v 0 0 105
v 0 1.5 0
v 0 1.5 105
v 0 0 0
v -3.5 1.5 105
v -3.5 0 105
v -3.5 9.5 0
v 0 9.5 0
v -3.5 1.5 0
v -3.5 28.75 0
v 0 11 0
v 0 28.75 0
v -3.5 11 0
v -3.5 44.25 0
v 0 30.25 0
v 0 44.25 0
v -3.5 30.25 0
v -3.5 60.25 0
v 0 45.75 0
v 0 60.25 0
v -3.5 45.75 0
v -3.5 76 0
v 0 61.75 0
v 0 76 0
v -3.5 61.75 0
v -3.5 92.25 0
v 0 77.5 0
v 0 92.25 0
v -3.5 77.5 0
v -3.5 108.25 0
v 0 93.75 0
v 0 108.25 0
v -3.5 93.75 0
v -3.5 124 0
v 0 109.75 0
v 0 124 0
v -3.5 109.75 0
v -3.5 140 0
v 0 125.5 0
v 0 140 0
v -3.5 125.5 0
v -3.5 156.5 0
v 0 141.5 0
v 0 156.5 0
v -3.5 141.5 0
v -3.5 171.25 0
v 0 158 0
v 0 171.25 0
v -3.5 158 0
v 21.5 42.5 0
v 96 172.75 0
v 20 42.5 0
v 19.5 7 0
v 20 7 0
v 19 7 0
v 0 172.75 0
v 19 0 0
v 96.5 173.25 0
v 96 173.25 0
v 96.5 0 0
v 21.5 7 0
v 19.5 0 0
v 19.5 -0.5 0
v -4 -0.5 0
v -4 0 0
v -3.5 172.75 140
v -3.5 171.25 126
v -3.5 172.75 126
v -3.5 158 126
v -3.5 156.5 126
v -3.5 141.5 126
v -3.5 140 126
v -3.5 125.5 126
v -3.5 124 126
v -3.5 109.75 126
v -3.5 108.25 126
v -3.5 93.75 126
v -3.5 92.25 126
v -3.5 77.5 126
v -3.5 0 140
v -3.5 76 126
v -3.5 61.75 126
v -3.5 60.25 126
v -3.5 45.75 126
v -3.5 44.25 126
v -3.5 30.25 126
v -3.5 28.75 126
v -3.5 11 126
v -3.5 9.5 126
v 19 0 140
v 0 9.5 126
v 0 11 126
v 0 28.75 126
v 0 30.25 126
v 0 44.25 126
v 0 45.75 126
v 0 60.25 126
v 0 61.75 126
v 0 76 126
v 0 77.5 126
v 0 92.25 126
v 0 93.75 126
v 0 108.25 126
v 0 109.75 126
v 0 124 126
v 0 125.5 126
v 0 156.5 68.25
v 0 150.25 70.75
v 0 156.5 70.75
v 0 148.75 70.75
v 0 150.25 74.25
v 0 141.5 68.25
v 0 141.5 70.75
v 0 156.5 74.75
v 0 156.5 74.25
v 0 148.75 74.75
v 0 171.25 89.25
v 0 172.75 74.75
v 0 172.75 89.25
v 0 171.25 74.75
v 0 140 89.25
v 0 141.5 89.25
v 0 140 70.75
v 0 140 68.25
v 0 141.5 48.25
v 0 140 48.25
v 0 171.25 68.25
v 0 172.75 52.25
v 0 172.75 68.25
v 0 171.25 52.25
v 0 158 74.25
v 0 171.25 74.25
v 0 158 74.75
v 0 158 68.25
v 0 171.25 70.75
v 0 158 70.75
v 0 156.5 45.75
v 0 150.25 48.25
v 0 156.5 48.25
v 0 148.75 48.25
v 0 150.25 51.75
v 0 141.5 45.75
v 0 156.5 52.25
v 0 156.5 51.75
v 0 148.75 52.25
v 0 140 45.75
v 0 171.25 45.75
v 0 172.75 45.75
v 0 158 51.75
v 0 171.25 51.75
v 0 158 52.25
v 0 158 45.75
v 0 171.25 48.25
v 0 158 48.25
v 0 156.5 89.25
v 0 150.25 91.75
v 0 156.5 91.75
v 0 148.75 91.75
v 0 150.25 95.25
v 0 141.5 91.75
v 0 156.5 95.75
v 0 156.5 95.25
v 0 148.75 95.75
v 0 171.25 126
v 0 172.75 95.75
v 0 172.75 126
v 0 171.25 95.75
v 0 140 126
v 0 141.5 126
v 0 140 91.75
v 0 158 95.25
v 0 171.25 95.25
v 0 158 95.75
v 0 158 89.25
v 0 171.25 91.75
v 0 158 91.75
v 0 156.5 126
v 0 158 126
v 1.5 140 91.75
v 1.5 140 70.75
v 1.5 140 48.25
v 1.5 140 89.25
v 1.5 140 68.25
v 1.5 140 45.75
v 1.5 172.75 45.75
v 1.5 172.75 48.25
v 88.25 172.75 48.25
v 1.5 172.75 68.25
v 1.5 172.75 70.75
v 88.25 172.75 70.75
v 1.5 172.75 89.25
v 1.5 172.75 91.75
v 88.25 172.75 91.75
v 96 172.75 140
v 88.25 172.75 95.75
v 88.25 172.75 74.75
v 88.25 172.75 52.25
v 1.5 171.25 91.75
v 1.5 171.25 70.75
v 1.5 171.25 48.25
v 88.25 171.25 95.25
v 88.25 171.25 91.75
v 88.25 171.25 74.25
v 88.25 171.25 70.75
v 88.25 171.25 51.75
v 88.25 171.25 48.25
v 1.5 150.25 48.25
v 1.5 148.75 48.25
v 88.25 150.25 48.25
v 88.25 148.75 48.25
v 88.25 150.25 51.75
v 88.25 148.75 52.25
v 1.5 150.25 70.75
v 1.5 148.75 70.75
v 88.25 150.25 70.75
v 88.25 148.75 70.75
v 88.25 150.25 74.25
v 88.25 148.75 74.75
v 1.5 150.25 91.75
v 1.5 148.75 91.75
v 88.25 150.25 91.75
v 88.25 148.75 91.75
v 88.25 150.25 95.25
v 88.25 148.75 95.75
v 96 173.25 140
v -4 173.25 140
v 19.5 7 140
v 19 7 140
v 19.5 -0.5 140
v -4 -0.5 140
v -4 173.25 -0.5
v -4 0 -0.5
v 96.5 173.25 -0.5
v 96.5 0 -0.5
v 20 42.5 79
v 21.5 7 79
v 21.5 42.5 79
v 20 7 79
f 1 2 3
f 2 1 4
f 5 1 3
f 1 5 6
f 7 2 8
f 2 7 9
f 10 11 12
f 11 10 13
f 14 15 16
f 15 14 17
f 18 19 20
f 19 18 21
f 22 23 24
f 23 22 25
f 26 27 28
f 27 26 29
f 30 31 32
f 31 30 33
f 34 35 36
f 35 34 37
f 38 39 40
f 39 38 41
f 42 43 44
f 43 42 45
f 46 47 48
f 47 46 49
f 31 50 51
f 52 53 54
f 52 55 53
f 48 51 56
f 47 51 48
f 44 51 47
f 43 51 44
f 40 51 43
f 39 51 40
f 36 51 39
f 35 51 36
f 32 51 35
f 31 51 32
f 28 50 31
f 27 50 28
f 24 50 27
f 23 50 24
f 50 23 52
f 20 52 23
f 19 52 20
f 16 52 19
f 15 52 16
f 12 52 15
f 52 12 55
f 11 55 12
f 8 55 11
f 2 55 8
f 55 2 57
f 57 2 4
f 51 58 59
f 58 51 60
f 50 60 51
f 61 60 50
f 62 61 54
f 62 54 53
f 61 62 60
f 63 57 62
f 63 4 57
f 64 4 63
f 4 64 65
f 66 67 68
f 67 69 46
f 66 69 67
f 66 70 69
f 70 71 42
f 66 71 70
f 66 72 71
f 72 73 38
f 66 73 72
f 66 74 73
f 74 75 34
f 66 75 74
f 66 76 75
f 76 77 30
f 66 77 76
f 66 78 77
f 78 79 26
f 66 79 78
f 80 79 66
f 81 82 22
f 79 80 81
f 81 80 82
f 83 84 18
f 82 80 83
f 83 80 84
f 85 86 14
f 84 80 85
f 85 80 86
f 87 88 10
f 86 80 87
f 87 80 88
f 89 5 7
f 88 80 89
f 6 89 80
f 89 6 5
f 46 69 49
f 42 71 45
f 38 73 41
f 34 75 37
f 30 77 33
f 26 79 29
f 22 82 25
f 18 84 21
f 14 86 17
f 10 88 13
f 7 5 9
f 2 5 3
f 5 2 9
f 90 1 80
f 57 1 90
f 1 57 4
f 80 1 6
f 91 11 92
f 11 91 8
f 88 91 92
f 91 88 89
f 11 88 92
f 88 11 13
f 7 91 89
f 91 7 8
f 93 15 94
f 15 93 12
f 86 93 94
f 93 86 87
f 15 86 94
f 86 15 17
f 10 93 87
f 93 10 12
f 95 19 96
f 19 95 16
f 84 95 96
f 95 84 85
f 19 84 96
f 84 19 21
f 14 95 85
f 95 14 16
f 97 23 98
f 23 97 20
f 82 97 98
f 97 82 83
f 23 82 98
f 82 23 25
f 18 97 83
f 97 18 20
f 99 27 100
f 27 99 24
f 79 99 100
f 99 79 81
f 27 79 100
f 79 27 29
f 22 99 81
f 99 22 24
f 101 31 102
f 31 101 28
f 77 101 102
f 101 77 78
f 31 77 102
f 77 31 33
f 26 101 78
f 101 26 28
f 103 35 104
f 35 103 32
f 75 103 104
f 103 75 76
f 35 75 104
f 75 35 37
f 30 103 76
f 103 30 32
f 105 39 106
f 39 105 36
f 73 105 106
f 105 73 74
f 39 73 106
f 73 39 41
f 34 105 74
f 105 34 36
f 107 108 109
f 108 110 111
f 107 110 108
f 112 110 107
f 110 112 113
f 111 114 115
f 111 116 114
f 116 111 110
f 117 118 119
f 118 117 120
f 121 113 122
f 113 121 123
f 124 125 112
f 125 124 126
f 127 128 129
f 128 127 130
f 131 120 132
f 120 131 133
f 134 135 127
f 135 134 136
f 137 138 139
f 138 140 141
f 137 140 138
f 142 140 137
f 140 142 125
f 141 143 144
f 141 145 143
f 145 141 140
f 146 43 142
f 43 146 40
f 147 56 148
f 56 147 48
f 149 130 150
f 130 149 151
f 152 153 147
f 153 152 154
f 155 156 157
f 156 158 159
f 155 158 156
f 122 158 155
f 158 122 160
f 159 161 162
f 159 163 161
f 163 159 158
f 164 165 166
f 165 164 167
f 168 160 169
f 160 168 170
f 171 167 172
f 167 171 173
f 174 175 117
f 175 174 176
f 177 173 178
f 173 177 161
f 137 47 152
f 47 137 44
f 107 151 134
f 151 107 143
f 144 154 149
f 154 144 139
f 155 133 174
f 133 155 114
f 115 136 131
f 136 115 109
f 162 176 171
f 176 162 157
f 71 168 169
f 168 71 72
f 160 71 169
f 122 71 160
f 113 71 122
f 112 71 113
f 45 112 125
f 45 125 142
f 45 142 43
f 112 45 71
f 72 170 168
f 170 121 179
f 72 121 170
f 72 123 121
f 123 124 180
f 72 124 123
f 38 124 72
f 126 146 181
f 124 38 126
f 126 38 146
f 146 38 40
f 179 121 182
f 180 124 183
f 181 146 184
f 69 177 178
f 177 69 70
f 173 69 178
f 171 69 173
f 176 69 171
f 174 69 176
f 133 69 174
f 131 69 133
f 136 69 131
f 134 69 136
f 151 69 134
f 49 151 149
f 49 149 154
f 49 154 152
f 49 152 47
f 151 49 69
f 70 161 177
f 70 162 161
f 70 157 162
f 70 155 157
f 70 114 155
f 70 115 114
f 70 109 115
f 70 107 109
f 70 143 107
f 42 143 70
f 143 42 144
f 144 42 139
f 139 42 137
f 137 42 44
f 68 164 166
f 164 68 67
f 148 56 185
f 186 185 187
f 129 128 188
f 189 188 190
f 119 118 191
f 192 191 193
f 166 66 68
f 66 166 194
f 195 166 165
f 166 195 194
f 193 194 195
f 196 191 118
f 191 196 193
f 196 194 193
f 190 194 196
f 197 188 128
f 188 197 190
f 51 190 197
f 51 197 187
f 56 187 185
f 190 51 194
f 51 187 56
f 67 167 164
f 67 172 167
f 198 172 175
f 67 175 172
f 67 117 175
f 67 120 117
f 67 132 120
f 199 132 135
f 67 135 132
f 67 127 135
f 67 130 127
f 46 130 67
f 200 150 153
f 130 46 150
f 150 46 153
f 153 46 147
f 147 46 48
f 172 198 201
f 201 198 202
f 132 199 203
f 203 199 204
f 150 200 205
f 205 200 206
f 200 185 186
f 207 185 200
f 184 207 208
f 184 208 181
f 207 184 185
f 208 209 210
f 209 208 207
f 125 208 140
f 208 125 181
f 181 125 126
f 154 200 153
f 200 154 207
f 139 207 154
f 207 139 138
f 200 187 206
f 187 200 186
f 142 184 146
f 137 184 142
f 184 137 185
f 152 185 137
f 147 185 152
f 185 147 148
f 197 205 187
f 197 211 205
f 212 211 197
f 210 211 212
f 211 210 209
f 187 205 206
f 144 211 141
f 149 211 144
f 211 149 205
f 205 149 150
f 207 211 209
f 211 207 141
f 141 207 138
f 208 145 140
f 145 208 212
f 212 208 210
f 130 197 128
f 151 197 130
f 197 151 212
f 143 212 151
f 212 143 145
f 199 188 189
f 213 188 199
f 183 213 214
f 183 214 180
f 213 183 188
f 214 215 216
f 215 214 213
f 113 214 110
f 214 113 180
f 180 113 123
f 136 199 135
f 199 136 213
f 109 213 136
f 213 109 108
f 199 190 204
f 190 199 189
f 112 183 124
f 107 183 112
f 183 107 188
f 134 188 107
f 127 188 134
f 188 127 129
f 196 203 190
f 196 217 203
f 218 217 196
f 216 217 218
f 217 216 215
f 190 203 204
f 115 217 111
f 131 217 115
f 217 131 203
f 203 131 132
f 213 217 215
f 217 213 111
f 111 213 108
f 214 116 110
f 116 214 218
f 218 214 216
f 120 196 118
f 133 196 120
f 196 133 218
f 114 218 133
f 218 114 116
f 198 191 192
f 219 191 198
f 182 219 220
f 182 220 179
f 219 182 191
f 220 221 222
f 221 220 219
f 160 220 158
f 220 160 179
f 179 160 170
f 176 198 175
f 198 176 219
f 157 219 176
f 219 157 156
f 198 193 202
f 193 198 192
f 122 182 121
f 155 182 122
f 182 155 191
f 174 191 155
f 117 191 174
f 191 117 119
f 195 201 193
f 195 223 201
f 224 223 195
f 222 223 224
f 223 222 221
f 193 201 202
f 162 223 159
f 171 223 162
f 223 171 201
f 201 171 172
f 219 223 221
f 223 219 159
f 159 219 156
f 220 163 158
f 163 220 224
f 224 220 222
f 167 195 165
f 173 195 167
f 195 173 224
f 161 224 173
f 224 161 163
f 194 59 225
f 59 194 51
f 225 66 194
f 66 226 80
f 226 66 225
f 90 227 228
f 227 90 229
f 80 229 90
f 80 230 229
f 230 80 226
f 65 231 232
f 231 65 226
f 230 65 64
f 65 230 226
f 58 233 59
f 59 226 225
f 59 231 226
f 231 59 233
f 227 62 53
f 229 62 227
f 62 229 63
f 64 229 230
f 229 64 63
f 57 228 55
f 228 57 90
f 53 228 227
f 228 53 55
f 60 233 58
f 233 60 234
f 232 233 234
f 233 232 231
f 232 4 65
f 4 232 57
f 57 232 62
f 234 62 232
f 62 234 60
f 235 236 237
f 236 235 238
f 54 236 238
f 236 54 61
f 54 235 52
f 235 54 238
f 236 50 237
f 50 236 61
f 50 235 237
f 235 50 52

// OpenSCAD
room_width = 172.75; // Not measured, inferred from 10 measurements below. If I had to guess, +/- 2" error

translate([-3.5, 0, 0]){
    cube([3.5, 1.5, 105]);
    S(9.5);
    S(28.75);
    S(44.25);
    S(60.25);
    S(76);
    S(92.25);
    S(108.25);
    S(124);
    S(140);
    S(156.5);
    S(171.25);
}
Shelf(45.75);
Shelf(68.25);
Shelf(89.25);

color("grey")
translate([-4, room_width, 0])
    cube([100, 0.5, 140]);
color("grey")
translate([-4, 0, 0,])
    cube([0.5, room_width + 0.5, 140]);
color("grey")
translate([-4, -0.5, 0])
    cube([23.5, 0.5, 140]);
color("grey")
translate([19, -0.5, 0])
    cube([0.5, 7.5, 140]);
color("grey")
translate([-4, 0, -0.5])
    cube([100.5, room_width + 0.5, 0.5]);


// Door
translate([20, 7, 0])
    rotate([0, 0, 90])
    translate([0, -1.5, 0])
    cube([35.5, 1.5, 79]);


module S(d) {
    translate([0, d, 0])
        cube([3.5, 1.5, 126]);
}

module Shelf(h) {
    translate([0, room_width - 32.75, h])
        cube([1.5, 32.75, 2.5]);
    translate([0, room_width - 24, h + 2.5])
        cube([88.25, 1.5, 3.5]);
    translate([0, room_width - 1.5, h + 2.5])
        cube([88.25, 1.5, 3.5]);
    translate([0, room_width - 24, h + 6])
        cube([88.25, 24, 0.5]);
}
